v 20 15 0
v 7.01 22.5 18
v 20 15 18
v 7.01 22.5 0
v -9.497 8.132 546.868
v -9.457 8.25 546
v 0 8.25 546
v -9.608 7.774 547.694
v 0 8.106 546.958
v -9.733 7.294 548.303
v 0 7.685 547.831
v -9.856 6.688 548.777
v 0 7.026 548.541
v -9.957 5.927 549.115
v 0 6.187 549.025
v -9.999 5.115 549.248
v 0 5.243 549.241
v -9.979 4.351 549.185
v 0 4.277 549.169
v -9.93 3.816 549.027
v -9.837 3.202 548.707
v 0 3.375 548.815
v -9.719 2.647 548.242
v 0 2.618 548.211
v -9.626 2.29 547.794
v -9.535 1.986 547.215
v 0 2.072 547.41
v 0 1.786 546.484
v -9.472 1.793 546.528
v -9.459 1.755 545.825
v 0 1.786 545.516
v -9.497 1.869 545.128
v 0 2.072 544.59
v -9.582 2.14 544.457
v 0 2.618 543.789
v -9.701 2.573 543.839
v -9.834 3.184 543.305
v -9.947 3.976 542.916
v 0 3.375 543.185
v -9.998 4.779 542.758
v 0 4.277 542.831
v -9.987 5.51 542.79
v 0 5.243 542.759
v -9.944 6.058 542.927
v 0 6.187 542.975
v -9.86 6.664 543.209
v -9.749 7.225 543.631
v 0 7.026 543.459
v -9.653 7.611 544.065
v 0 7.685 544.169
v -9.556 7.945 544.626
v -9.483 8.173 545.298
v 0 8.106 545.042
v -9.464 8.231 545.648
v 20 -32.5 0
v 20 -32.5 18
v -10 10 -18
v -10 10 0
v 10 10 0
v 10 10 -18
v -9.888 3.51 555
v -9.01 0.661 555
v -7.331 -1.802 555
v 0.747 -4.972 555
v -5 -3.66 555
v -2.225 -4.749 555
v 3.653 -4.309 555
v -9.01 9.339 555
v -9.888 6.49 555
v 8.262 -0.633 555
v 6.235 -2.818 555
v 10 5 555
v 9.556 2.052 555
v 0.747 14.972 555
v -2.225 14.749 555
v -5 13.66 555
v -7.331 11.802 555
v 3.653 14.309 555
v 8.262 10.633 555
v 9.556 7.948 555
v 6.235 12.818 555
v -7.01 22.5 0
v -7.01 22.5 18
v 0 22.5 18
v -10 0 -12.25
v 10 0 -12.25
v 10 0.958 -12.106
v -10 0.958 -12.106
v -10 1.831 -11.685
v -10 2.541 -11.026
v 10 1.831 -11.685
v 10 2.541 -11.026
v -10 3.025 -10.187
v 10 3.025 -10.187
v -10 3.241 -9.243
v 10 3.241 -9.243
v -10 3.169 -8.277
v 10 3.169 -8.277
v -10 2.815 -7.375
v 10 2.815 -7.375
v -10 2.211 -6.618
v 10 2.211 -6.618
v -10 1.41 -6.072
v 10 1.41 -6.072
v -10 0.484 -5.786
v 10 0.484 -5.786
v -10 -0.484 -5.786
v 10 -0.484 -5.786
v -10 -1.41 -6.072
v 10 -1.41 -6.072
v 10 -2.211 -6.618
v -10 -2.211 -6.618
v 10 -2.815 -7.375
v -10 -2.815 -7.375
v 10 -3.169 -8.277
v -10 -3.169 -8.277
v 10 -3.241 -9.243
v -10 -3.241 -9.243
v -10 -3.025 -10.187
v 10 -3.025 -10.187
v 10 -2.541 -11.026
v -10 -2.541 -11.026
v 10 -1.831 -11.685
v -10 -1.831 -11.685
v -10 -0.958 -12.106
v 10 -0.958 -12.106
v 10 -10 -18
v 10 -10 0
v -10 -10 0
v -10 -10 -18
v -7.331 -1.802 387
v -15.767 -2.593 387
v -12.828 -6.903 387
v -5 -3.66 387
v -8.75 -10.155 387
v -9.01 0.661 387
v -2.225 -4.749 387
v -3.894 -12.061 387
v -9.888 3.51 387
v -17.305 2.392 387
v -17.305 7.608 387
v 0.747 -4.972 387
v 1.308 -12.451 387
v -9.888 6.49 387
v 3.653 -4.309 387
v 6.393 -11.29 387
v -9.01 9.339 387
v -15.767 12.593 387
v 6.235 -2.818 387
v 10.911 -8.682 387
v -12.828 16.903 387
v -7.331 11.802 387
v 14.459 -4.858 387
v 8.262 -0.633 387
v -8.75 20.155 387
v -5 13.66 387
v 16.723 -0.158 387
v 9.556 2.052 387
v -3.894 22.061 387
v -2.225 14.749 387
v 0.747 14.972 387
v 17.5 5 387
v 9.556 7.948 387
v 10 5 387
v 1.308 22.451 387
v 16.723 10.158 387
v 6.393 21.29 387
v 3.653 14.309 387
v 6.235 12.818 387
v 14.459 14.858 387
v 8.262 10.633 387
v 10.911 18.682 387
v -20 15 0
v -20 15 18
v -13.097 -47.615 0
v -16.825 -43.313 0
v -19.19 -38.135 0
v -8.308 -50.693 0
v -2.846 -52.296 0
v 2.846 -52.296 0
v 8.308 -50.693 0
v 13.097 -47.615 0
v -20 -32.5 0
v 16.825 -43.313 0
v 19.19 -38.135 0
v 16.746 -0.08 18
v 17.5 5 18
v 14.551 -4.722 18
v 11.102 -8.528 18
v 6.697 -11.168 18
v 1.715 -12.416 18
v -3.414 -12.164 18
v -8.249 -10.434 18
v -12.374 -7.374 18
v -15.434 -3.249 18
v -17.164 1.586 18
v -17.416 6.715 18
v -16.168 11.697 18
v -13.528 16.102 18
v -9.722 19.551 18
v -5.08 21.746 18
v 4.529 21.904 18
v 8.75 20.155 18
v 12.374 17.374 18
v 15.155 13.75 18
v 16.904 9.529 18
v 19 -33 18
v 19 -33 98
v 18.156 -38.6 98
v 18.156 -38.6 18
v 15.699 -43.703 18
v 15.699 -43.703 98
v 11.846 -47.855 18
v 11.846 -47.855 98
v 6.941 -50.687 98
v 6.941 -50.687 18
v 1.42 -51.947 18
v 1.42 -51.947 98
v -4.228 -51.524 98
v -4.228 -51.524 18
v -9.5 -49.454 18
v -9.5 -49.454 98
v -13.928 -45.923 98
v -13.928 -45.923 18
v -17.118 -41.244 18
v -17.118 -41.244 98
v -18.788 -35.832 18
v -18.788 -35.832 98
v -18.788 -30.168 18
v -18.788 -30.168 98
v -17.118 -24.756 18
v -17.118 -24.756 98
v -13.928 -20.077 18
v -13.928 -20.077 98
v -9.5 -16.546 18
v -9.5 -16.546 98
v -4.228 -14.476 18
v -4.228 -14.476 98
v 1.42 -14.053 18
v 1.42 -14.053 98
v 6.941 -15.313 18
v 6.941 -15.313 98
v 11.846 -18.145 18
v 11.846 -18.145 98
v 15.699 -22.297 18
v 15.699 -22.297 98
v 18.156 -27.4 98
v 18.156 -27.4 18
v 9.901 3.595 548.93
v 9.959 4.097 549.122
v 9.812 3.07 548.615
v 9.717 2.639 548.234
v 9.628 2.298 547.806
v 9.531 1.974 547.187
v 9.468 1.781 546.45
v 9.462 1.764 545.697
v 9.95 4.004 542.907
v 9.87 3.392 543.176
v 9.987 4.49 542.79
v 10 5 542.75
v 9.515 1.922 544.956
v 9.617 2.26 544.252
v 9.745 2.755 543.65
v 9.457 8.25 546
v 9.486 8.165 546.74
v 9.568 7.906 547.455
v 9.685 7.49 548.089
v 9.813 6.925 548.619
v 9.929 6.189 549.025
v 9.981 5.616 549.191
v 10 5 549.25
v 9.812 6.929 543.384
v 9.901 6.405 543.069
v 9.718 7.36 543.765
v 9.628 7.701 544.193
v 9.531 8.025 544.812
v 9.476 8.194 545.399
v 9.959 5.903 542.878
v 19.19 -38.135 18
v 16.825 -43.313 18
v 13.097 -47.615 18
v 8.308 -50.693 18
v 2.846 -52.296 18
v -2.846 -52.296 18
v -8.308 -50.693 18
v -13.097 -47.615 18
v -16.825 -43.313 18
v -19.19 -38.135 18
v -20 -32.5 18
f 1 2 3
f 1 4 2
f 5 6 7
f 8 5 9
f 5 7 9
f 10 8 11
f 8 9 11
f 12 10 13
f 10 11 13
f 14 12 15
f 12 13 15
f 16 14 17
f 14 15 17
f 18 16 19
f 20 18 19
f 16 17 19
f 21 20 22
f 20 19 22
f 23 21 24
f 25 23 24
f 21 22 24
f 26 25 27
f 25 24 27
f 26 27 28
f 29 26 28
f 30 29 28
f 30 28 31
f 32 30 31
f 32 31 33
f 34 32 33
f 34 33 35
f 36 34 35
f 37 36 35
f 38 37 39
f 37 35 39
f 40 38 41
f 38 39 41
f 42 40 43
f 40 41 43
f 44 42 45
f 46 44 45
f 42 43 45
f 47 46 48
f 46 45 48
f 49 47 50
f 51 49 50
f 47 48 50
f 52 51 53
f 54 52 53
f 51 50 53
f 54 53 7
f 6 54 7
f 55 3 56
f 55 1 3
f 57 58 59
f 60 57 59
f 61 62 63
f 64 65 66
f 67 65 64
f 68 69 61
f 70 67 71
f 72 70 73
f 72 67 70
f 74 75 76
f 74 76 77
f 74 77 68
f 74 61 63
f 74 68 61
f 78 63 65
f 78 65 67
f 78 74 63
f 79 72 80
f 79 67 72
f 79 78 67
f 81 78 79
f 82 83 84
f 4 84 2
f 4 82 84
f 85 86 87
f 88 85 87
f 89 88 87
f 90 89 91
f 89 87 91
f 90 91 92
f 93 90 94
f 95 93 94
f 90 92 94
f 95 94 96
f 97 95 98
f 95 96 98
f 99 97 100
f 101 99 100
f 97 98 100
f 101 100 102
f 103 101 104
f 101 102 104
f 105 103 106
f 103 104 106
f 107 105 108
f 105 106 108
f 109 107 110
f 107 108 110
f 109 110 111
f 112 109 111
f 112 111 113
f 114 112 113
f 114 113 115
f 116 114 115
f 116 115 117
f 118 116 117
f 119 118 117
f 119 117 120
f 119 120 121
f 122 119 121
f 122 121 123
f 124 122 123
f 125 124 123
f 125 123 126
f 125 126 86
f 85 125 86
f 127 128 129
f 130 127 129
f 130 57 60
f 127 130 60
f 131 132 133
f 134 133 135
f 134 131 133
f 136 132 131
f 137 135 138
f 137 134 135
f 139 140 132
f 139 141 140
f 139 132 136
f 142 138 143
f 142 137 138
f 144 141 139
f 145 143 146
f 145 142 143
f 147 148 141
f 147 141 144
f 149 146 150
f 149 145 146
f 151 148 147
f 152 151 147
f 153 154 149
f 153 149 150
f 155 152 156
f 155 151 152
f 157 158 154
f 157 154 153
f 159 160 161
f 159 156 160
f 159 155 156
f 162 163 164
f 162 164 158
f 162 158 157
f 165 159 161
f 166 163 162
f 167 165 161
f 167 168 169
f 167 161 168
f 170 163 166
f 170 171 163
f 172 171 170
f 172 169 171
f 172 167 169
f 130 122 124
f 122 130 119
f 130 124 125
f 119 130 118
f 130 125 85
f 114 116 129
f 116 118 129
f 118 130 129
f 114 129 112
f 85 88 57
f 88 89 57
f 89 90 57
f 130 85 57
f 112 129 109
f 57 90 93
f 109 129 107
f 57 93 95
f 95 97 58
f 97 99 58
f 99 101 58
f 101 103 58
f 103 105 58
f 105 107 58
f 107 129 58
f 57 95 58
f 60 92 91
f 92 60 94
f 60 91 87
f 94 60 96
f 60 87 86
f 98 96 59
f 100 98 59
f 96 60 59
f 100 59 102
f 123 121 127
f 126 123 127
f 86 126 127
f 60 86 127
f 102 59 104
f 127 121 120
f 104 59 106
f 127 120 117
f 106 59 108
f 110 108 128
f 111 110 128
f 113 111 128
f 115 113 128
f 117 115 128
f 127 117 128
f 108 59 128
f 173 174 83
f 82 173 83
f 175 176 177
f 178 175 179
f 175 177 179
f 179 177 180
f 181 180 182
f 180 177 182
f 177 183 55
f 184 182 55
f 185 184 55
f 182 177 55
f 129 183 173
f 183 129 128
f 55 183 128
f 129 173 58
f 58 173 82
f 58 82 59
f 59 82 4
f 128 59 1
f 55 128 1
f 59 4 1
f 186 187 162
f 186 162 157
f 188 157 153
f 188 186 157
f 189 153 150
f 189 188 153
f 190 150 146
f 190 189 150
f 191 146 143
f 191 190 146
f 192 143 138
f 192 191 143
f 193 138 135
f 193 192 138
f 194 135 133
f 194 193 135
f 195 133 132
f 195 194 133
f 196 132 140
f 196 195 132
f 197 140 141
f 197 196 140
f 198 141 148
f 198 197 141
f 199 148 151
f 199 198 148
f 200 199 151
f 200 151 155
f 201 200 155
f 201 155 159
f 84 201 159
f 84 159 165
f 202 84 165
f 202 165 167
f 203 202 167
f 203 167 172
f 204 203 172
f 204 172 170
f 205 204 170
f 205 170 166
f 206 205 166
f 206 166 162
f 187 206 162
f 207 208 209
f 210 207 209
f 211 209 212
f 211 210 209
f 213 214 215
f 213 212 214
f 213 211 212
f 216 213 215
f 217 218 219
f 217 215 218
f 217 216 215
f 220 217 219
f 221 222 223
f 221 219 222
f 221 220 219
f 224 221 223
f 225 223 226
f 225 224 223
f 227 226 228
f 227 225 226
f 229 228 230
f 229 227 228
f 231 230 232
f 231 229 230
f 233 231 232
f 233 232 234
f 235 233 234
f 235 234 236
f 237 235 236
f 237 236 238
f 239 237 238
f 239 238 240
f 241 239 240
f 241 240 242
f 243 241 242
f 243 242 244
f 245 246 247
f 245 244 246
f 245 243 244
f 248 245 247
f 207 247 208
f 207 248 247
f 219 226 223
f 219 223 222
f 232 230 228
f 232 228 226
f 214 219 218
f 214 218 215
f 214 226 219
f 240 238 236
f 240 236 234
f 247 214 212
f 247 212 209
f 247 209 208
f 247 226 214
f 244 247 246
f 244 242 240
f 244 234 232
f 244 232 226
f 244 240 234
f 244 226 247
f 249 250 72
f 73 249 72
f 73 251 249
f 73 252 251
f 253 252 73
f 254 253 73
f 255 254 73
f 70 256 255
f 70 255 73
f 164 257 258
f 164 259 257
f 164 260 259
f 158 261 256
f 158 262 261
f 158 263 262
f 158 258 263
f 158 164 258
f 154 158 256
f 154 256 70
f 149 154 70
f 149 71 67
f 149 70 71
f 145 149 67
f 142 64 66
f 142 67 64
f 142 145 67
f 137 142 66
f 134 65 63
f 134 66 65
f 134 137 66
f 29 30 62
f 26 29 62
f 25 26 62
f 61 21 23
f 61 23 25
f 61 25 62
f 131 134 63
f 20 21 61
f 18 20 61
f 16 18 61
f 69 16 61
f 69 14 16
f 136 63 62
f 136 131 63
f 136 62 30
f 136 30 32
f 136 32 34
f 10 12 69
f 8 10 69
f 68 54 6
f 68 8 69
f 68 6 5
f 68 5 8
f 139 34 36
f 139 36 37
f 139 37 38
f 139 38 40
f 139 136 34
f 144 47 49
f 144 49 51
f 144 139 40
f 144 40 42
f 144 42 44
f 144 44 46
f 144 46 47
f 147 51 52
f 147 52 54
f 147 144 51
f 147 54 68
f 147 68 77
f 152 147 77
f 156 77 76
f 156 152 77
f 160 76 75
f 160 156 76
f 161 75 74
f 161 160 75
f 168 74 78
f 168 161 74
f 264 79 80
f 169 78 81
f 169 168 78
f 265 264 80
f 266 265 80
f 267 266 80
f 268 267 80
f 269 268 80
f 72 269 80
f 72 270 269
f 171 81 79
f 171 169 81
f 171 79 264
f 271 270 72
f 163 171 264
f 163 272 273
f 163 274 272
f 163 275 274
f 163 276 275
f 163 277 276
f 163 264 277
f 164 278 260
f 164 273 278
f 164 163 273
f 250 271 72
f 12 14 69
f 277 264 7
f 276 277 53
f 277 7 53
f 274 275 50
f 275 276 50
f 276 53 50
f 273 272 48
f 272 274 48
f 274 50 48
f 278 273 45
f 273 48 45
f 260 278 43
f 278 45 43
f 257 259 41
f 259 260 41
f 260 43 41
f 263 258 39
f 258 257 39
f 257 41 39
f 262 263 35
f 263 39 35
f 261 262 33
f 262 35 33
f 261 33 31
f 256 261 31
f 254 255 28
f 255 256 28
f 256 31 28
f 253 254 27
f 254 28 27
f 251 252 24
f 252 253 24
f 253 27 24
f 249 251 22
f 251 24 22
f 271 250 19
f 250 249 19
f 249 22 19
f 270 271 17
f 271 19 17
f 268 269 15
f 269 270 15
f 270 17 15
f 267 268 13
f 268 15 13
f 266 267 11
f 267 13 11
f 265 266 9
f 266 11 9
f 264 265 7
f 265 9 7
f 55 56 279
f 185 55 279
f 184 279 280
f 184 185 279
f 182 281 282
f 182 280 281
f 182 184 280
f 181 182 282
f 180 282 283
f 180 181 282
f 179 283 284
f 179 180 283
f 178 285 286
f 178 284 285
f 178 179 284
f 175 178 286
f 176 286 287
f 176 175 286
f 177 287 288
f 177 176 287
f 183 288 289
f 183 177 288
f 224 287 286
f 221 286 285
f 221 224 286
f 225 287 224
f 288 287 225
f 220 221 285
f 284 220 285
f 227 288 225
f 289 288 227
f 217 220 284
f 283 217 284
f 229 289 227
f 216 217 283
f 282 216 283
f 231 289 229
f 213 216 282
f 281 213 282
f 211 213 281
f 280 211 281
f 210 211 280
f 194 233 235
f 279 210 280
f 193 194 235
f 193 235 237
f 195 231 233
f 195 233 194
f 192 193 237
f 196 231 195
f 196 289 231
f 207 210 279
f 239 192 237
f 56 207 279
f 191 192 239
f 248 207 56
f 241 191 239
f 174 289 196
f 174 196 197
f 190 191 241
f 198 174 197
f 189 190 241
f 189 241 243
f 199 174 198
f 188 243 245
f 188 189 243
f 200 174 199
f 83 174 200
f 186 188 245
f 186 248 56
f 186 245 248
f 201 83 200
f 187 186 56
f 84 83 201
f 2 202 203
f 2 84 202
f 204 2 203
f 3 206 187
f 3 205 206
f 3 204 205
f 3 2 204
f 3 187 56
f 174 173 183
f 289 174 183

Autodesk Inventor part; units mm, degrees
ref_plane "YZ Plane" through (0, 0, 0) normal (1, 0, 0) x (0, 1, 0)
ref_plane "XZ Plane" through (0, 0, 0) normal (0, 1, 0) x (-1, 0, 0)
ref_plane "XY Plane" through (0, 0, 0) normal (0, 0, 1) x (1, 0, 0)
sketch "Sketch1" plane through (0, 0, 0) normal (0, 0, 1) x (1, 0, 0)
  line L0 (-10, -10) -> (10, -10)
  line L1 (10, -10) -> (10, 10)
  line L2 (10, 10) -> (-10, 10)
  line L3 (-10, 10) -> (-10, -10)
  line L4 (-10, -10) -> (10, 10) construction
  line L5 (10, -10) -> (-10, 10) construction
  line L6 (-20, 15) -> (-20, -32.5)
  line L7 (-20, 15) -> (-7.0096, 22.5)
  line L8 (-20, 15) -> (-5, 15) construction
  line L9 (-7.0096, 22.5) -> (7.0096, 22.5)
  line L10 (7.0096, 22.5) -> (20, 15)
  line L11 (20, 15) -> (20, -32.5)
  circle A0 centre (0, -32.5) radius 20 construction
  arc A1 (-20, -32.5) -> (20, -32.5) centre (0, -32.5) ccw
  point P0 (0, 0)
  point P1 (0, 22.5)
  point P2 (0, 10)
  dimension "d0" = 20
  dimension "d1" = 20
  dimension "d3" = 15
  dimension "d4" = 30
  dimension "d5" = 15
  dimension "d6" = 150
  dimension "d8" = 40
  dimension "d9" = 5
  dimension "d10" = 40
  dimension "d11" = 55
extrude "Extrusion1" add sketch "Sketch1" along normal blind 18
sketch "Sketch2" plane through (0, 0, 18) normal (0, 0, 1) x (1, 0, 0)
  line L0 (-10, -10) -> (-10, 10) projected
  line L1 (-10, 10) -> (10, 10) projected
  line L2 (10, 10) -> (10, -10) projected
  line L3 (10, -10) -> (-10, -10) projected
  line L4 (-20, 15) -> (-20, -32.5) projected
  arc A0 (-20, -32.5) -> (20, -32.5) centre (0, -32.5) ccw projected
  line L5 (20, -32.5) -> (20, 15) projected
  line L6 (20, 15) -> (7.0096, 22.5) projected
  line L7 (7.0096, 22.5) -> (-7.0096, 22.5) projected
  line L8 (-7.0096, 22.5) -> (-20, 15) projected
  point P0 (0, 0)
extrude "Extrusion2" add sketch "Sketch2" against normal blind 36 contours L0 L1 L2 L3
sketch "Sketch3" plane through (10, -10, 0) normal (1, 0, 0) x (0, 0, -1)
  circle A0 centre (9, 10) radius 3.25
  line L0 (0, 20) -> (18, 20) projected
  line L1 (0, 0) -> (0, 20) projected
  point P0 (0, 10)
  point P1 (9, 20)
  point P2 (0, 10)
  dimension "d16" = 6.5
extrude "Extrusion3" cut sketch "Sketch3" against normal through all
sketch "Sketch4" plane through (0, 0, 18) normal (0, 0, 1) x (1, 0, 0)
  circle A0 centre (0, 5) radius 17.5
  line L0 (7.0096, 22.5) -> (-7.0096, 22.5) projected
  point P0 (0, 0)
  point P1 (0, 22.5)
  dimension "d19" = 35
extrude "Extrusion4" add sketch "Sketch4" along normal blind 369
sketch "Sketch5" plane through (0, 0, 18) normal (0, 0, 1) x (1, 0, 0)
  circle A0 centre (0, -33) radius 19
  circle A1 centre (0, 5) radius 17.5 projected
  point P0 (0, 0)
  dimension "d22" = 38
  dimension "d23" = 38
extrude "Extrusion5" add sketch "Sketch5" along normal blind 80 contours A0
sketch "Sketch10" plane through (0, 5, 387) normal (0, 0, 1) x (1, 0, 0)
  circle A0 centre (0, 0) radius 10
  circle A1 centre (0, 0) radius 17.5 projected
  point P0 (0, -5)
  dimension "d32" = 20
extrude "Extrusion8" add sketch "Sketch10" along normal blind 150 contours A0
sketch "Sketch6" plane through (0, 5, 537) normal (0, 0, 1) x (1, 0, 0)
  circle A0 centre (0, 0) radius 17.5
  circle A1 centre (0, 0) radius 10
  point P0 (0, -5)
  dimension "d26" = 20
extrude "Extrusion6" add sketch "Sketch6" along normal blind 18 contours A1
sketch "Sketch8" plane through (0, 0, 0) normal (1, 0, 0) x (0, 1, 0)
  line L0 (15, 555) -> (-5, 555) projected
  line L1 (-5, 387) -> (15, 387) projected
  circle A0 centre (5, 546) radius 3.25
  line L2 (15, 555) -> (-5, 555) projected
  line L3 (15, 555) -> (15, 537)
  point P0 (0, 0)
  point P1 (5, 387)
  point P2 (15, 546)
  dimension "d29" = 6.5
  dimension "d35" = 18
extrude "Extrusion7" cut sketch "Sketch8" along normal through all both and the other way through all
properties part number "LinearActuator450" material "Steel, Carbon"
